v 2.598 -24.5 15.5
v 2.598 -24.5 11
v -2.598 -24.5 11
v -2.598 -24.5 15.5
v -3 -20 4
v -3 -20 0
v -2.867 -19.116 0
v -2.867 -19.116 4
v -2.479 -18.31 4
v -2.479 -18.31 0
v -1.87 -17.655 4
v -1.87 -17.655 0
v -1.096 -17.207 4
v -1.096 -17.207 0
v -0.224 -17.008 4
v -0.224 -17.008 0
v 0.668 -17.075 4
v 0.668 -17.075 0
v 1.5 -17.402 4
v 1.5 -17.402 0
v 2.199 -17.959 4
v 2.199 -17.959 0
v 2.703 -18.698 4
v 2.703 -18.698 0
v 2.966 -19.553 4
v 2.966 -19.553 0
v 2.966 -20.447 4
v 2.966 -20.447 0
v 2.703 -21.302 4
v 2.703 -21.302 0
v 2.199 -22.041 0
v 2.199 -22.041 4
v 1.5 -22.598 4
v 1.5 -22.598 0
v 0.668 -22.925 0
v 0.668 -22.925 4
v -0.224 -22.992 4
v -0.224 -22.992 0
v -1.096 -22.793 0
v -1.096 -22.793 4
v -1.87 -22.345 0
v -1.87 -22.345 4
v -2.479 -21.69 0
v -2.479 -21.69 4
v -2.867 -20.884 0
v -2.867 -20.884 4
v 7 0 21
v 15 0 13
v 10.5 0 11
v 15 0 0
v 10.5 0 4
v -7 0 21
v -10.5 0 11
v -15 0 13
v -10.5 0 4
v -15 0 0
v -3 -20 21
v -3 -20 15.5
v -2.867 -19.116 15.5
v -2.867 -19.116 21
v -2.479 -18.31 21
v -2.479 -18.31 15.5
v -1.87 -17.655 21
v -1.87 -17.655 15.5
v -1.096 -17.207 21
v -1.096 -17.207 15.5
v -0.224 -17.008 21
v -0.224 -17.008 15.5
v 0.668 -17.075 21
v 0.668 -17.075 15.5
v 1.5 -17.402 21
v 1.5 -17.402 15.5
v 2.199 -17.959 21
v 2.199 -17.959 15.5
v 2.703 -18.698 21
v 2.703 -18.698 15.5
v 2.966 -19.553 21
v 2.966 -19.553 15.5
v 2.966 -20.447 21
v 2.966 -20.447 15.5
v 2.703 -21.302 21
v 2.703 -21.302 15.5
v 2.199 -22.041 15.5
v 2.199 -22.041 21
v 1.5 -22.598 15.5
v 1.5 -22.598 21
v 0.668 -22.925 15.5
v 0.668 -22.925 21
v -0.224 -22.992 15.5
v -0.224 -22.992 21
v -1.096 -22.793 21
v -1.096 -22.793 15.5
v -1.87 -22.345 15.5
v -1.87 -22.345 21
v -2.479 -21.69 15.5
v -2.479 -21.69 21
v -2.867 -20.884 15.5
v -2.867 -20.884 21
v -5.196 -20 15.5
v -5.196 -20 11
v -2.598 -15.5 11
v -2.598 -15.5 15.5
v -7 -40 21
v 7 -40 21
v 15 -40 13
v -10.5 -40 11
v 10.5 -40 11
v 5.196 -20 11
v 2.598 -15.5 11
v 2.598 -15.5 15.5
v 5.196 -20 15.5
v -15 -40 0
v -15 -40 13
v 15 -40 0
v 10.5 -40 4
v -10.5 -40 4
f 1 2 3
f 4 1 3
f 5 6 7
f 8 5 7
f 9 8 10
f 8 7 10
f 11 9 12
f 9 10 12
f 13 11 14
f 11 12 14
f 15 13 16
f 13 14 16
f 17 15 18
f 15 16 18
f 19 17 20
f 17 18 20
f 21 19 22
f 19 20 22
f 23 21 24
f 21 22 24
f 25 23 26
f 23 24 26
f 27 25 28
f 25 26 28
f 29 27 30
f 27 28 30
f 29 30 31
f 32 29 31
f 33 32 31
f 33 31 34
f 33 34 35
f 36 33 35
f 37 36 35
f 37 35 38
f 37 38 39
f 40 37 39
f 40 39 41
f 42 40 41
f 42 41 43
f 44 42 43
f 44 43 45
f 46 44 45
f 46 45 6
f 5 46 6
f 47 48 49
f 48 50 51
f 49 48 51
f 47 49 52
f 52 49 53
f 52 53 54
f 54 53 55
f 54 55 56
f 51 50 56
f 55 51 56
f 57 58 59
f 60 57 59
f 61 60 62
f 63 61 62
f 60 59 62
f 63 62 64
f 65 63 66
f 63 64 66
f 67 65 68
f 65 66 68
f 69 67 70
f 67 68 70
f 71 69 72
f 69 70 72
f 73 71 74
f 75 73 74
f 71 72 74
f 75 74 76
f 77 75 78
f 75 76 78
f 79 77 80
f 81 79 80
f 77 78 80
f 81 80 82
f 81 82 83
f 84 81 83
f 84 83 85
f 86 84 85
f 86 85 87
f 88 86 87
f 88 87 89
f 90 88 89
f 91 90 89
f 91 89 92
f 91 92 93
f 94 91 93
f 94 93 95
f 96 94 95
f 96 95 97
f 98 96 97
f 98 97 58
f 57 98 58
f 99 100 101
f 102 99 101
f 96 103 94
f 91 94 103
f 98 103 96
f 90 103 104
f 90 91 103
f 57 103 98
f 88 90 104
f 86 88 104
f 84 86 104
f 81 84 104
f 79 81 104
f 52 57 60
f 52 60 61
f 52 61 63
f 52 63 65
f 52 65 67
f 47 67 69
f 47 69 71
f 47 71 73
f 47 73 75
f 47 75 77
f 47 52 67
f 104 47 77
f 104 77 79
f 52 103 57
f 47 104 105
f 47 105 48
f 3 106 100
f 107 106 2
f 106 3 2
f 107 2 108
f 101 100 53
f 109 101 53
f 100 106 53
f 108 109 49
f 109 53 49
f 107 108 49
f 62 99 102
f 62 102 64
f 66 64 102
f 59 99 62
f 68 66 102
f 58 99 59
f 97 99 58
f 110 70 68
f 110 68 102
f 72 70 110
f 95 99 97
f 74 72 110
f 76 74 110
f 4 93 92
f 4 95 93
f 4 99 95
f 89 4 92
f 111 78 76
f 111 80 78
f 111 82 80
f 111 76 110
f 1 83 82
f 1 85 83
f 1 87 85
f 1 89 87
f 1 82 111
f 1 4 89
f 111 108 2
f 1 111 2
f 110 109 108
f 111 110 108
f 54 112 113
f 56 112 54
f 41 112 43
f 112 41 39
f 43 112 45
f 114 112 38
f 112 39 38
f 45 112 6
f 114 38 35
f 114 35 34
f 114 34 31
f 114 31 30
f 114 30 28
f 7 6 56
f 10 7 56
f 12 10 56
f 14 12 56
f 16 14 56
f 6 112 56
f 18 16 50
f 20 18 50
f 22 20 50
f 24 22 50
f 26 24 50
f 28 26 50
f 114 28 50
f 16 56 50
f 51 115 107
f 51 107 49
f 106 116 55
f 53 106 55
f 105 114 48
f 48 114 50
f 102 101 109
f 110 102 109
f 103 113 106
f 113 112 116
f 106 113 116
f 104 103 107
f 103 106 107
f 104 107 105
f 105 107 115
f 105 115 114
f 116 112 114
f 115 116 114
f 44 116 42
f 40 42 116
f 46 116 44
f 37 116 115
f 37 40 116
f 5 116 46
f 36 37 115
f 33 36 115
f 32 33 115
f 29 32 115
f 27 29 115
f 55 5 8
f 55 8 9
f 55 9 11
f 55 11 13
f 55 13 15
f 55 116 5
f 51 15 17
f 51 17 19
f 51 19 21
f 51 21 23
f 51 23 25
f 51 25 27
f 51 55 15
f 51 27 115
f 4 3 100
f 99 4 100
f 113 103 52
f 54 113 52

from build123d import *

# Parameters (mm, degrees)
F0_W     = 30
F0_H     = 35
F0_H_2   = 5
F1_DEPTH = 4
F2_W     = 4.5
F2_H     = 40
F3_DEPTH = 7
F4_W     = 4.5
F4_H     = 40
F4_W_2   = 25.5
F5_DEPTH = 10
F7_D     = 6
F8_R     = 3
F9_DEPTH = 4.5
F10_SIZE = 8


# Not quite as in the source:
# - a feature names something its author has since deleted; it is built from what else it names


with BuildPart() as f1:
    # F0 (on Top) → F1 (new body)
    with BuildSketch(Plane.XY):
        with Locations((0, -22.5)):
            Rectangle(F0_W, F0_H)
        with Locations((0, -2.5)):
            Rectangle(F0_W, F0_H_2)
    extrude(amount=F1_DEPTH)

    # F2 (on face) → F3 (join)
    with BuildSketch(Plane.XY.offset(4)):
        with Locations((12.75, -20)):
            Rectangle(F2_W, F2_H)
        with Locations((-12.75, -20)):
            Rectangle(F2_W, F2_H)
    extrude(amount=F3_DEPTH)

    # F4 (on face) → F5 (join)
    with BuildSketch(Plane.XY.offset(11)):
        with Locations((12.75, -20)):
            Rectangle(F4_W, F4_H)
        with Locations((-2.25, -20)):
            Rectangle(F4_W_2, F4_H)
    extrude(amount=F5_DEPTH)

    # F7 (through all)
    with Locations(Plane.XY.offset(21)):
        with Locations((0, -20)):
            Hole(F7_D / 2)

    # F8 (on face) → F9 (cut)
    with BuildSketch(Plane(origin=(0, 0, 11), x_dir=(1, 0, 0), z_dir=(0, 0, -1))):
        Polygon((2.5980762114, 24.5), (-2.5980762114, 24.5), (-5.1961524227, 20), (-2.5980762114, 15.5), (2.5980762114, 15.5), (5.1961524227, 20), align=None)
        with Locations((0, 20)):
            Circle(F8_R, mode=Mode.SUBTRACT)
    extrude(amount=-F9_DEPTH, mode=Mode.SUBTRACT)

    # F10
    f10_edges = [f1.edges().sort_by_distance(p)[0] for p in [
        (-15, -20, 21),
        (15, -20, 21),
    ]]
    chamfer(f10_edges, length=F10_SIZE)


solid = f1.part
